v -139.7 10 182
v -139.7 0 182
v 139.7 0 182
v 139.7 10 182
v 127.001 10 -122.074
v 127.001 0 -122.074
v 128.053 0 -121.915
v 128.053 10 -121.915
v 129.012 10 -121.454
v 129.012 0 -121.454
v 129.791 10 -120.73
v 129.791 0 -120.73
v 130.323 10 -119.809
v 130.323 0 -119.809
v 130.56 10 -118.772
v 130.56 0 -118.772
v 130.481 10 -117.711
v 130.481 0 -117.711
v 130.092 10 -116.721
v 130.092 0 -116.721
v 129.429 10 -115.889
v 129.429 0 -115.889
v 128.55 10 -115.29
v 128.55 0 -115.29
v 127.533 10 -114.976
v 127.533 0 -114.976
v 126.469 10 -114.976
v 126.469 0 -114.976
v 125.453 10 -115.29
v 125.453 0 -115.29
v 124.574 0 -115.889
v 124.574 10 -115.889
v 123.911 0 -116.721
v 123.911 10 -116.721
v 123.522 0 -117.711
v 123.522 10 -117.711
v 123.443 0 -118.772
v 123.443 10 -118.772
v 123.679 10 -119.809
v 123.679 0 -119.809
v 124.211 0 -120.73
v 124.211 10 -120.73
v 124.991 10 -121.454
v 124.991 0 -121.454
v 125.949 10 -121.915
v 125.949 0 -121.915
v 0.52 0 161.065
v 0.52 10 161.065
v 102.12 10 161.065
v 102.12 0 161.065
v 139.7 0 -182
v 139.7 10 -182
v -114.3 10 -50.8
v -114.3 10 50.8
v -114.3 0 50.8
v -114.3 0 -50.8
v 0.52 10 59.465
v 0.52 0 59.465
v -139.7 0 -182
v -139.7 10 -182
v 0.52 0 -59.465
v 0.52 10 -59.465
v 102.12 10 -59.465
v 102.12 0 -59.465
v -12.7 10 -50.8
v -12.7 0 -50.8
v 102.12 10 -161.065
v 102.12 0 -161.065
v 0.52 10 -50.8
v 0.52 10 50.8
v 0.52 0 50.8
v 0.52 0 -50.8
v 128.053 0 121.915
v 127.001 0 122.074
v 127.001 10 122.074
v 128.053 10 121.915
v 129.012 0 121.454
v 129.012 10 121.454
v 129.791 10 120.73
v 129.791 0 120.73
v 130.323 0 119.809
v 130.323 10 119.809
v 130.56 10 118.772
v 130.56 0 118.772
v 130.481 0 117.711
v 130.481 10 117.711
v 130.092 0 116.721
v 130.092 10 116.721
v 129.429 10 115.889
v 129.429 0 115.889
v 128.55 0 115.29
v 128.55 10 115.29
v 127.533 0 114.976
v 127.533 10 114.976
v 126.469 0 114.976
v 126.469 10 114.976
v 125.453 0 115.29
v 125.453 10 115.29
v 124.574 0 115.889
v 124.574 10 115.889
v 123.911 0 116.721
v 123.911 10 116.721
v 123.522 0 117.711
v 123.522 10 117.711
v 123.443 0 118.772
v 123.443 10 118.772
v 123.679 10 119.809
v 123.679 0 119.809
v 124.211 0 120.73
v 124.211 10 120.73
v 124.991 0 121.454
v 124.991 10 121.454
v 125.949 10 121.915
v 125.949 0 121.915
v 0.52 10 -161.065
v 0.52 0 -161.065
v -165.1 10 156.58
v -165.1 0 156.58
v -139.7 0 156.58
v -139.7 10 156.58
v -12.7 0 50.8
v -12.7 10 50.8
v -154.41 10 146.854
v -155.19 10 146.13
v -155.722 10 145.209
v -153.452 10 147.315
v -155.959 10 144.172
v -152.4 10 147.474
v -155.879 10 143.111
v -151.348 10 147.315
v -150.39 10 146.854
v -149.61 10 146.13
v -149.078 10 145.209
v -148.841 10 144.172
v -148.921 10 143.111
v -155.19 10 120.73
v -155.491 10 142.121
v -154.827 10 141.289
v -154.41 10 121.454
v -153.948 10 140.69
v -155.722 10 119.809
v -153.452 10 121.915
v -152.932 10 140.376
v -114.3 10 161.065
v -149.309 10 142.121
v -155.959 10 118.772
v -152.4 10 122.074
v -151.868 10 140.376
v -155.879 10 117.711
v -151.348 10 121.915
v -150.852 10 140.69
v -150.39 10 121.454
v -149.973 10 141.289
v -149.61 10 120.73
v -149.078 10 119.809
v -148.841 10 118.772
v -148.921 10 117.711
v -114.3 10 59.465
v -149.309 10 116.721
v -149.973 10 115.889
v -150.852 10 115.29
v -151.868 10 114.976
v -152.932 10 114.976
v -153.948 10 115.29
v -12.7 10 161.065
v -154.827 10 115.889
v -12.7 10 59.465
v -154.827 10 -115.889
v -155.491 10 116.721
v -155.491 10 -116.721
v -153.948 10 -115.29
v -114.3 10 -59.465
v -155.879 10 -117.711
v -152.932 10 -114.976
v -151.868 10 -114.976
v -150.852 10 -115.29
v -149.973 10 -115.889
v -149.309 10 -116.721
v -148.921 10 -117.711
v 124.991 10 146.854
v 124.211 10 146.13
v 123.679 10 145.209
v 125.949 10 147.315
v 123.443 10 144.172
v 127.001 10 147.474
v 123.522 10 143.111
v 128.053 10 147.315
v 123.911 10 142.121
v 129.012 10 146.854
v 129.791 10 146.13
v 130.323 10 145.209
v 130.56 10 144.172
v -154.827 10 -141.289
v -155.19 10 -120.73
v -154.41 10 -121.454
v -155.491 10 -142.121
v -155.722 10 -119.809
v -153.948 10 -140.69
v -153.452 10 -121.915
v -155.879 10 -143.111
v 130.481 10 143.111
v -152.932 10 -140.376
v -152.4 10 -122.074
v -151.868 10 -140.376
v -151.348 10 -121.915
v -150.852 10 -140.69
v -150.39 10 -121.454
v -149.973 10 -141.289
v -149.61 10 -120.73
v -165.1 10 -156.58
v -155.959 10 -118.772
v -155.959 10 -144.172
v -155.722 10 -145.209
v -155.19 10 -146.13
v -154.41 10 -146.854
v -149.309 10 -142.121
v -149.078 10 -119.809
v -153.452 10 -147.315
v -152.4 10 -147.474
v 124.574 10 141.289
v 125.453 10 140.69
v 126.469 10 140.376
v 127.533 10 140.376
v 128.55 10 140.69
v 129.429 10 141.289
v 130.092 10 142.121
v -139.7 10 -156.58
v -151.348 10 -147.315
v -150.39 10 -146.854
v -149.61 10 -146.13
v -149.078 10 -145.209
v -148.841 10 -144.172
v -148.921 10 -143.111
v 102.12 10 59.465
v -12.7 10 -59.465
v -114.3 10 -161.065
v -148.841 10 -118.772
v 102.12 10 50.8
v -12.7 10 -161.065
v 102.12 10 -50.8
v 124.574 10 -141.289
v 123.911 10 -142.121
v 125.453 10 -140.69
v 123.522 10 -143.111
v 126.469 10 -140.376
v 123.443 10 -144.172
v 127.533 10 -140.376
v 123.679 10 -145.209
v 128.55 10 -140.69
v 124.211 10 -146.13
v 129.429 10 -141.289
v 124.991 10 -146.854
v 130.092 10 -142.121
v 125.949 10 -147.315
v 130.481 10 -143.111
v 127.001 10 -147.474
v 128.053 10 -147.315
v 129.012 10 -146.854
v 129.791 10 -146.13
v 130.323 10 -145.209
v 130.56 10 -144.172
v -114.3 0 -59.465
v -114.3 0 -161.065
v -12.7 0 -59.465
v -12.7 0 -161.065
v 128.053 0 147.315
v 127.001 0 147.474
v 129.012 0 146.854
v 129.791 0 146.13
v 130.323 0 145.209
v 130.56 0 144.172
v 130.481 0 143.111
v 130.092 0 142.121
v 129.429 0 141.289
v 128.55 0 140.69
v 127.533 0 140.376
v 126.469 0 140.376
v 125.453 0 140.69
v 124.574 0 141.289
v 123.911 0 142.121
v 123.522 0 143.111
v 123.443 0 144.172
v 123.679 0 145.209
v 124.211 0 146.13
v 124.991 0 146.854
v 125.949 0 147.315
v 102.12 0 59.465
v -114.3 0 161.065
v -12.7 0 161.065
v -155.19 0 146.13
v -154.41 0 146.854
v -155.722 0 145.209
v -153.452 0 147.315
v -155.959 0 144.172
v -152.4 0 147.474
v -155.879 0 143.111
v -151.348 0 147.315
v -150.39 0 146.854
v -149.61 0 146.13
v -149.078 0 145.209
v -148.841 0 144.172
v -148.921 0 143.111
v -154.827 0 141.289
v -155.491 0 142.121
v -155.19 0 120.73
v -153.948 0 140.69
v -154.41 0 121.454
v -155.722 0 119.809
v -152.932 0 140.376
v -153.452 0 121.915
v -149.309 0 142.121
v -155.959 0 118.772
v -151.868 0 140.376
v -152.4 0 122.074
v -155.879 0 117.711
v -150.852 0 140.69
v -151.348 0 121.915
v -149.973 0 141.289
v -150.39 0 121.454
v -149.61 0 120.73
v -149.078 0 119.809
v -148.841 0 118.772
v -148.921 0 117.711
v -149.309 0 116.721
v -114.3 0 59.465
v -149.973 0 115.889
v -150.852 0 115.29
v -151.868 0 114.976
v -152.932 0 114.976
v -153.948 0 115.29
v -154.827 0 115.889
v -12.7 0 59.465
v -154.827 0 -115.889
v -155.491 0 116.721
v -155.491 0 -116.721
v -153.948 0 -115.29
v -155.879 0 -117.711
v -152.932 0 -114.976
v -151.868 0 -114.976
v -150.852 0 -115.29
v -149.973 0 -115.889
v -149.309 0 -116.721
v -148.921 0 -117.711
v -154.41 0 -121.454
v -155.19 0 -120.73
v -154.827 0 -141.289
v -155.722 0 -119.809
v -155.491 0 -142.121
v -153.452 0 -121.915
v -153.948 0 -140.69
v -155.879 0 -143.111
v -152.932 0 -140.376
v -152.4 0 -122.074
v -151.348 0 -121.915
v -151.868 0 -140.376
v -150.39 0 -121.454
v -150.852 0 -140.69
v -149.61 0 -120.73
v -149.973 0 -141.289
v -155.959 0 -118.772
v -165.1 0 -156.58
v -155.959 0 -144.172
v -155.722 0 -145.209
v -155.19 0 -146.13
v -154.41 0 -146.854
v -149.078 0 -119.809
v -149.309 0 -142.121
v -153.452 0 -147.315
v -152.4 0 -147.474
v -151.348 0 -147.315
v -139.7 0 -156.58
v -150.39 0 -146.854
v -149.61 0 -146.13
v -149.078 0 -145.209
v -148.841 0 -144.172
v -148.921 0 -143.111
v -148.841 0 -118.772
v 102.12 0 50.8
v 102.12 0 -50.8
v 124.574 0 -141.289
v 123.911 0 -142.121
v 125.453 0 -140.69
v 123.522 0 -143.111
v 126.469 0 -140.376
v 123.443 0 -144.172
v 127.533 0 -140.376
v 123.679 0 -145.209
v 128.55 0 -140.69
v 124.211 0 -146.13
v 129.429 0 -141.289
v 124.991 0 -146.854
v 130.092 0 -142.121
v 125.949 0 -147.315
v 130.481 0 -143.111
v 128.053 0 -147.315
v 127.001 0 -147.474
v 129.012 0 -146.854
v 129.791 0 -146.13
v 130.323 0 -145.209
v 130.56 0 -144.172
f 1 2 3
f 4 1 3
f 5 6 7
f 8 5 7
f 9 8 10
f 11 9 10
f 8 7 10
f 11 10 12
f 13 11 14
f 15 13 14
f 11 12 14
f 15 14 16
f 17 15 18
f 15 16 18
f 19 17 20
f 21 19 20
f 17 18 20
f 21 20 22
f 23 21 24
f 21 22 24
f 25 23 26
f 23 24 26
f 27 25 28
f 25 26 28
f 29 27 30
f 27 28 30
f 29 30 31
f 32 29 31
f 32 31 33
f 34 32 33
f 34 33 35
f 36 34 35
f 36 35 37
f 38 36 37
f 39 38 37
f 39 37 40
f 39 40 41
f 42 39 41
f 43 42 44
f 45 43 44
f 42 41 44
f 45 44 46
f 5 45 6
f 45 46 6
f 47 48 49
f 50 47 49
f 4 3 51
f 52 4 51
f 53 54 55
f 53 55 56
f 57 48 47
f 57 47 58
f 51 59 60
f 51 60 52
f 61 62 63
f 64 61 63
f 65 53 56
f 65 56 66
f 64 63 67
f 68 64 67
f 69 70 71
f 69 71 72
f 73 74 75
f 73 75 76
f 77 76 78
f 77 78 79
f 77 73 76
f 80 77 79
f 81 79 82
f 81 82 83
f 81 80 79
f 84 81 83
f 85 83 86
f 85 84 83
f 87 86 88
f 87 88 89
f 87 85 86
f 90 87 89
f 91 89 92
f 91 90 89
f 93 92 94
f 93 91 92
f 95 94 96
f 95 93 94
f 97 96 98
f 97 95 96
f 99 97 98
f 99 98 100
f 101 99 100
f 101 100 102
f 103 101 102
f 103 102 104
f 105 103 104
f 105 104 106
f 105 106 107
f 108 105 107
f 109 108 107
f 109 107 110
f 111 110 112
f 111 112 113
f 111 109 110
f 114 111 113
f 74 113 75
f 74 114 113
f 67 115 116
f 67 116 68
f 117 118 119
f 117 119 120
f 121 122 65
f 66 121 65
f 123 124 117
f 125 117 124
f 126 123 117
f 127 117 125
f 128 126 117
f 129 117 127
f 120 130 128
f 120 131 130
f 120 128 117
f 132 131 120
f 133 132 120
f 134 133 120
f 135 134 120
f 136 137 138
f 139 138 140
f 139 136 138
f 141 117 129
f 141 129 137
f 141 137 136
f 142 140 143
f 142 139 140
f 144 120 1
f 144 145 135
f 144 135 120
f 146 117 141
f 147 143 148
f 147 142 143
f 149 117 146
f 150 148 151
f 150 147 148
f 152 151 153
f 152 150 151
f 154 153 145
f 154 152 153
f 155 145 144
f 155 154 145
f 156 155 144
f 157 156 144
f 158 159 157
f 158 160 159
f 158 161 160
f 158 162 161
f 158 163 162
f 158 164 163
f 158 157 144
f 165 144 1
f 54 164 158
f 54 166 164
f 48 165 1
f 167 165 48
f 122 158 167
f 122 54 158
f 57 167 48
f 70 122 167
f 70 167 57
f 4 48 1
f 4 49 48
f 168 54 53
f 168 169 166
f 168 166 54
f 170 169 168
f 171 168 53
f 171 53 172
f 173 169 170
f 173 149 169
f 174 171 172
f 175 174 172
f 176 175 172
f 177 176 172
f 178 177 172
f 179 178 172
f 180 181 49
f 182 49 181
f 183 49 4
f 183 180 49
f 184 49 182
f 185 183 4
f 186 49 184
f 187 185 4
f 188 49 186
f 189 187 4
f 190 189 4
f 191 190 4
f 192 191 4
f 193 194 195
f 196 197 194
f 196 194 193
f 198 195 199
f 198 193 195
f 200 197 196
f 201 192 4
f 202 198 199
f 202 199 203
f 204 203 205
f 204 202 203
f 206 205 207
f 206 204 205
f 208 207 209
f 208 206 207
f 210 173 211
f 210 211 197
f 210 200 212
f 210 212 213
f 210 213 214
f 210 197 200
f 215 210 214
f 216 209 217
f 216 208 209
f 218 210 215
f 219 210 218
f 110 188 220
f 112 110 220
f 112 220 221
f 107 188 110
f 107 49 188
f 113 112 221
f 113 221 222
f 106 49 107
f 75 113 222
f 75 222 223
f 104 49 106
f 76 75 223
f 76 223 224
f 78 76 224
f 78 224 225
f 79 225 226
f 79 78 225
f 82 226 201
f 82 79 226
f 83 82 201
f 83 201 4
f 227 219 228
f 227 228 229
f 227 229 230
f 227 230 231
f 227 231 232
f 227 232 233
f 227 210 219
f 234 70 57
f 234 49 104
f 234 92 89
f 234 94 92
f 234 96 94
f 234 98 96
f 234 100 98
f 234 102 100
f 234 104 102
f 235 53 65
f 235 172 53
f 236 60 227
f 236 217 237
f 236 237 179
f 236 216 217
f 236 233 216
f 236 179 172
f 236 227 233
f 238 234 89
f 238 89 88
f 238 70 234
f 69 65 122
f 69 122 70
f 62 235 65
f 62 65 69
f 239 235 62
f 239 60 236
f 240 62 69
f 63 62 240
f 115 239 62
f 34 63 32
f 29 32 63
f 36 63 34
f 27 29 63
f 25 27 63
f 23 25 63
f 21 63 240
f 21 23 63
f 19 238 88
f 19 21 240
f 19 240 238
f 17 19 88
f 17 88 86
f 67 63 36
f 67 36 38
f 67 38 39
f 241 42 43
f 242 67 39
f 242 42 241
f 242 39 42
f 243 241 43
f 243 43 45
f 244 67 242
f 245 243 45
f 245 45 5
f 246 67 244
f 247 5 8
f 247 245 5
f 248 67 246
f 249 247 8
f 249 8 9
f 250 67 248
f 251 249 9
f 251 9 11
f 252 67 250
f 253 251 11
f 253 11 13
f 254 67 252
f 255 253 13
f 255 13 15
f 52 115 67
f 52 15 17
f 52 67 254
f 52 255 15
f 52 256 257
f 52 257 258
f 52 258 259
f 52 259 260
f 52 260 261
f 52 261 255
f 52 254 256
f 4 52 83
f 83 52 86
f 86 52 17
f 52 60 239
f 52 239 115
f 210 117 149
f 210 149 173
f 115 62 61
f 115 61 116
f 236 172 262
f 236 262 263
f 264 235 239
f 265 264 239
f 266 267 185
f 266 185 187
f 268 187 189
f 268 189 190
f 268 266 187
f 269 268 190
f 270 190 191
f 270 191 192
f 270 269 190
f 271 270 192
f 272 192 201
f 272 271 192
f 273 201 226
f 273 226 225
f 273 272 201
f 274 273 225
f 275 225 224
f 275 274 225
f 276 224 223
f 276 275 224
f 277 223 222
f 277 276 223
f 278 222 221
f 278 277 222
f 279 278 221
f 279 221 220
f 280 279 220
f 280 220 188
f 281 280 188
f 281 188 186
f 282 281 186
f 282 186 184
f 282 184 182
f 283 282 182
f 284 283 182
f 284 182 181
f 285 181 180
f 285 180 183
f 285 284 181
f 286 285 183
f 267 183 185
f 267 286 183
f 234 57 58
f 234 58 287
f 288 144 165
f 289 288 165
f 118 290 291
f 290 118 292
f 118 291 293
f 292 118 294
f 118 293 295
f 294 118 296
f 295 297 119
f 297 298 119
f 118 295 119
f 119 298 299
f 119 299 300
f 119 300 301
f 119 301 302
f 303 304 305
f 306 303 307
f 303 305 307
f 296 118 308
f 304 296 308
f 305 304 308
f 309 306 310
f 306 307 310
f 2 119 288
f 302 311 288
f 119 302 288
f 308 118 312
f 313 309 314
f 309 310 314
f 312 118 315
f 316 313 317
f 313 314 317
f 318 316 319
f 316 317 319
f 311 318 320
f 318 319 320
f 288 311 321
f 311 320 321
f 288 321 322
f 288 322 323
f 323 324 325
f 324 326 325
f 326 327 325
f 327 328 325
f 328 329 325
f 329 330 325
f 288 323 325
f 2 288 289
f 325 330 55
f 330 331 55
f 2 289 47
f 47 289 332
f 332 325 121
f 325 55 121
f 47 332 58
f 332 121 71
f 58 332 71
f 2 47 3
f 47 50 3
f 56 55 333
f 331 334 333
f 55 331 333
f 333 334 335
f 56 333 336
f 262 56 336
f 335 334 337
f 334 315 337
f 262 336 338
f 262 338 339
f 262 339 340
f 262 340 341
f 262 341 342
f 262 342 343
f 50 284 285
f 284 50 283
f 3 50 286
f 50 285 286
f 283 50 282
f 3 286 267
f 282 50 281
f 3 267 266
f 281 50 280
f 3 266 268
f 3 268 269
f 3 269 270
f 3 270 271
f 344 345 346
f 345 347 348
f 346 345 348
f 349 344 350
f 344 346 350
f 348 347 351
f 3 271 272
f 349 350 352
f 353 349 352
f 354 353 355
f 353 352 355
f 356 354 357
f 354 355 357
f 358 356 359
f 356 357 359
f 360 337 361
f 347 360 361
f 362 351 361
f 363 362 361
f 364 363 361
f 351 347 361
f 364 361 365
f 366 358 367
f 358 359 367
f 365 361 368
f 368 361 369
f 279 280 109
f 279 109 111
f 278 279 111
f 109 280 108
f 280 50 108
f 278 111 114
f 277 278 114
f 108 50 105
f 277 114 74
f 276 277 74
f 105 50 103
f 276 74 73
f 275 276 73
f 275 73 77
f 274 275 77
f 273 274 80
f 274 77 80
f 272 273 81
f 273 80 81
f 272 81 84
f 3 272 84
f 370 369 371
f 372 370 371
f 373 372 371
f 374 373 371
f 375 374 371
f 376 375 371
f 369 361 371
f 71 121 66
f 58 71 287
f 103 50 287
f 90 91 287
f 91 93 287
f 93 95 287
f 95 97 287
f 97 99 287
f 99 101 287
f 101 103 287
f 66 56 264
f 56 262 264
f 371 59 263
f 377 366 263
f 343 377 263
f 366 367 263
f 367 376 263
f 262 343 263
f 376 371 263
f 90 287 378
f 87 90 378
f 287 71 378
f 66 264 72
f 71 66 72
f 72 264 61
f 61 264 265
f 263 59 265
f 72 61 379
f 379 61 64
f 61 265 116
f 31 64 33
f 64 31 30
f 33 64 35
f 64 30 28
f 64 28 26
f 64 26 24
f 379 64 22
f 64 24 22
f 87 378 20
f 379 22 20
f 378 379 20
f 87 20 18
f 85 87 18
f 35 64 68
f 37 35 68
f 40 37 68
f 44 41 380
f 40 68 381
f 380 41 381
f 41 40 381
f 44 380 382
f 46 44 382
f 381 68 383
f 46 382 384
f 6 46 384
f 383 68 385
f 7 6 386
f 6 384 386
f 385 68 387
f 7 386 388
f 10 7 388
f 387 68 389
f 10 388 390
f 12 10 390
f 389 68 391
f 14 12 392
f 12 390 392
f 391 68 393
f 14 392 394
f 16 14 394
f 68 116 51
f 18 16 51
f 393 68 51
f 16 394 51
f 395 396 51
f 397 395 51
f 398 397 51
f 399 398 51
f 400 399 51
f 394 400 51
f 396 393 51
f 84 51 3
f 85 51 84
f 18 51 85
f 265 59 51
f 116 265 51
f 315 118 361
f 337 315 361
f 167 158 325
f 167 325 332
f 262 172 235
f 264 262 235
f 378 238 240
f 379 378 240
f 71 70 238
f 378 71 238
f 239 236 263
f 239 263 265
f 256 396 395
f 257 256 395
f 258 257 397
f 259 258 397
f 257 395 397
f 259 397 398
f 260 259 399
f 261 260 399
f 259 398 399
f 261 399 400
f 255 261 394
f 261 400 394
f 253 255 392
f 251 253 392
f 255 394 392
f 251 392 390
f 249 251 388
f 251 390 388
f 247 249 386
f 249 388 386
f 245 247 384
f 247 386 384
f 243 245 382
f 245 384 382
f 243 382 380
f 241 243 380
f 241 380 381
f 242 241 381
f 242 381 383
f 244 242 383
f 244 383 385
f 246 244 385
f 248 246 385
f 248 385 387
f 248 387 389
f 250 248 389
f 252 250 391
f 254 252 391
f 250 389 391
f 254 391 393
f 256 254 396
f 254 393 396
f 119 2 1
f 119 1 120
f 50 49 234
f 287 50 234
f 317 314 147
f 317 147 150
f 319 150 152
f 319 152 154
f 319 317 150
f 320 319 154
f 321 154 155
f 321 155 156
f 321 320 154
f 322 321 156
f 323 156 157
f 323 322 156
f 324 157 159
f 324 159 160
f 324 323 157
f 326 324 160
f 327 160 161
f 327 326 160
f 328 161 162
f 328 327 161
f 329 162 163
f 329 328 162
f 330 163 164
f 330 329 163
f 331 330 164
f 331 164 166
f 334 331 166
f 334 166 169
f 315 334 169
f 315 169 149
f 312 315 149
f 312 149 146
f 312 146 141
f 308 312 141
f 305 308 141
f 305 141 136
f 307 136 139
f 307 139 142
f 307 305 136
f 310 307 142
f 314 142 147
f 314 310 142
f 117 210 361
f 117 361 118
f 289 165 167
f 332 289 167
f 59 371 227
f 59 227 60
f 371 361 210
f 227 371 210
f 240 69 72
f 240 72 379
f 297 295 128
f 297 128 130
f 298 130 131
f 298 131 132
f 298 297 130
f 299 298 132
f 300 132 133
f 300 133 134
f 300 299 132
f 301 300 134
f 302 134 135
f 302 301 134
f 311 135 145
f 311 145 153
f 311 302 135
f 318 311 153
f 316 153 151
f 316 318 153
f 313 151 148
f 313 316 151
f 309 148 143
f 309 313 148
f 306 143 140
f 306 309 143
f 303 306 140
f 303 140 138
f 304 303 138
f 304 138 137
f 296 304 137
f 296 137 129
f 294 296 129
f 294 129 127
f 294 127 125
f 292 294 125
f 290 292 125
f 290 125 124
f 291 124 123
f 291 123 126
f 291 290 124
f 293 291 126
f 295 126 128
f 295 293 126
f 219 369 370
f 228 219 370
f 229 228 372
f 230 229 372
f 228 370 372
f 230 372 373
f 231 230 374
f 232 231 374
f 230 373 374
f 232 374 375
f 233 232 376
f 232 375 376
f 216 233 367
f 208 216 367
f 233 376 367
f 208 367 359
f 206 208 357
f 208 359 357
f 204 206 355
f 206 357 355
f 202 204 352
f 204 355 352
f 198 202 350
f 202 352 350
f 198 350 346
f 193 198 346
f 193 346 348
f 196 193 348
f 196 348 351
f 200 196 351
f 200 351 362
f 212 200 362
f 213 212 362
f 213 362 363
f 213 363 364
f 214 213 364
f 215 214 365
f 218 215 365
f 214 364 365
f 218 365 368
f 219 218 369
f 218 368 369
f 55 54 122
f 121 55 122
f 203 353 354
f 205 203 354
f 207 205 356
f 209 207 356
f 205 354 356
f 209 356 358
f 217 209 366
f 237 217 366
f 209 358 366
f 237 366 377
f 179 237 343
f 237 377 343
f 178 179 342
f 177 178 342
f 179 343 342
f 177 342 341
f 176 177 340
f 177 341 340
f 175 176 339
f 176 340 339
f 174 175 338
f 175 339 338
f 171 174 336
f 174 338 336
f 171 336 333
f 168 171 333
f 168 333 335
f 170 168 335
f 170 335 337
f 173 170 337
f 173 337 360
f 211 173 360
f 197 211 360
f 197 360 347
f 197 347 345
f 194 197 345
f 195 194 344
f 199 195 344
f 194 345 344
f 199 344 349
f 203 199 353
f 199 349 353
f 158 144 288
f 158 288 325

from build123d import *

# Parameters (mm, degrees)
SKETCH1_W                 = 279.4
SKETCH1_H                 = 364
BOSS_EXTRUDE1_DEPTH       = 10
SKETCH2_W                 = 101.6
SKETCH2_H                 = 101.6
CUT_EXTRUDE1_DEPTH        = 230.652106457
LPATTERN1_COUNT           = 2
LPATTERN1_PITCH           = 110.265
LPATTERN2_COUNT           = 2
LPATTERN2_PITCH           = 110.265
LPATTERN3_COUNT           = 2
LPATTERN3_PITCH           = 114.82
LPATTERN3_COPY_1_SKETCH_W = 101.6
LPATTERN3_COPY_1_SKETCH_H = 101.6
LPATTERN3_COPY_1_DEPTH    = 230.652106457
LPATTERN3_COPY_2_SKETCH_W = 101.6
LPATTERN3_COPY_2_SKETCH_H = 101.6
LPATTERN3_COPY_2_DEPTH    = 230.652106457
SKETCH3_W                 = 313.16
SKETCH3_H                 = 10
BOSS_EXTRUDE2_DEPTH       = 25.4
SKETCH4_R                 = 3.5687
CUT_EXTRUDE2_DEPTH        = 10


with BuildPart() as part:
    # Sketch1 → Boss-Extrude1 (new body)
    with BuildSketch(Plane(origin=(0, 0, 0), x_dir=(1, 0, 0), z_dir=(0, 1, 0))):
        Rectangle(SKETCH1_W, SKETCH1_H)
    extrude(amount=BOSS_EXTRUDE1_DEPTH)

    # Sketch2 → Cut-Extrude1 (cut, through all)
    with BuildSketch(Plane(origin=(0, 10, 0), x_dir=(1, 0, 0), z_dir=(0, 1, 0))):
        with Locations((-63.5, 0)):
            Rectangle(SKETCH2_W, SKETCH2_H)
    cut_extrude1 = extrude(amount=-CUT_EXTRUDE1_DEPTH, mode=Mode.SUBTRACT)

    # LPattern1: Cut-Extrude1 ×2
    with Locations(*[(0, 0, -i * LPATTERN1_PITCH) for i in range(1, LPATTERN1_COUNT)]):
        add(cut_extrude1, mode=Mode.SUBTRACT)

    # LPattern2: Cut-Extrude1 ×2
    with Locations(*[(0, 0, i * LPATTERN2_PITCH) for i in range(1, LPATTERN2_COUNT)]):
        add(cut_extrude1, mode=Mode.SUBTRACT)

    # LPattern3: Cut-Extrude1 ×2
    with Locations(*[(i * LPATTERN3_PITCH, 0, 0) for i in range(1, LPATTERN3_COUNT)]):
        add(cut_extrude1, mode=Mode.SUBTRACT)

    # LPattern3 copy 1 sketch → LPattern3 copy 1 (cut, through all)
    with BuildSketch(Plane(origin=(114.82, 10, -110.265), x_dir=(1, 0, 0), z_dir=(0, 1, 0))):
        with Locations((-63.5, 0)):
            Rectangle(LPATTERN3_COPY_1_SKETCH_W, LPATTERN3_COPY_1_SKETCH_H)
    extrude(amount=-LPATTERN3_COPY_1_DEPTH, mode=Mode.SUBTRACT)

    # LPattern3 copy 2 sketch → LPattern3 copy 2 (cut, through all)
    with BuildSketch(Plane(origin=(114.82, 10, 110.265), x_dir=(1, 0, 0), z_dir=(0, 1, 0))):
        with Locations((-63.5, 0)):
            Rectangle(LPATTERN3_COPY_2_SKETCH_W, LPATTERN3_COPY_2_SKETCH_H)
    extrude(amount=-LPATTERN3_COPY_2_DEPTH, mode=Mode.SUBTRACT)

    # Sketch3 → Boss-Extrude2 (add)
    with BuildSketch(Plane.ZY.offset(139.7)):
        with Locations((0, 5)):
            Rectangle(SKETCH3_W, SKETCH3_H)
    extrude(amount=BOSS_EXTRUDE2_DEPTH)

    # Sketch4 → Cut-Extrude2 (cut)
    with BuildSketch(Plane.XZ):
        with Locations(Location((127.00134615, -118.505273154, 0), (0, 0, 270))):
            Circle(SKETCH4_R)
        with Locations(Location((127.00134615, -143.905273154, 0), (0, 0, 270))):
            Circle(SKETCH4_R)
        with Locations(Location((-152.4, -118.505273154, 0), (0, 0, 270))):
            Circle(SKETCH4_R)
        with Locations(Location((-152.4, -143.905273154, 0), (0, 0, 270))):
            Circle(SKETCH4_R)
    cut_extrude2 = extrude(amount=-CUT_EXTRUDE2_DEPTH, mode=Mode.SUBTRACT)

    # Mirror1: Cut-Extrude2 across plane
    add(cut_extrude2.mirror(Plane.XY), mode=Mode.SUBTRACT)


solid = part.part
